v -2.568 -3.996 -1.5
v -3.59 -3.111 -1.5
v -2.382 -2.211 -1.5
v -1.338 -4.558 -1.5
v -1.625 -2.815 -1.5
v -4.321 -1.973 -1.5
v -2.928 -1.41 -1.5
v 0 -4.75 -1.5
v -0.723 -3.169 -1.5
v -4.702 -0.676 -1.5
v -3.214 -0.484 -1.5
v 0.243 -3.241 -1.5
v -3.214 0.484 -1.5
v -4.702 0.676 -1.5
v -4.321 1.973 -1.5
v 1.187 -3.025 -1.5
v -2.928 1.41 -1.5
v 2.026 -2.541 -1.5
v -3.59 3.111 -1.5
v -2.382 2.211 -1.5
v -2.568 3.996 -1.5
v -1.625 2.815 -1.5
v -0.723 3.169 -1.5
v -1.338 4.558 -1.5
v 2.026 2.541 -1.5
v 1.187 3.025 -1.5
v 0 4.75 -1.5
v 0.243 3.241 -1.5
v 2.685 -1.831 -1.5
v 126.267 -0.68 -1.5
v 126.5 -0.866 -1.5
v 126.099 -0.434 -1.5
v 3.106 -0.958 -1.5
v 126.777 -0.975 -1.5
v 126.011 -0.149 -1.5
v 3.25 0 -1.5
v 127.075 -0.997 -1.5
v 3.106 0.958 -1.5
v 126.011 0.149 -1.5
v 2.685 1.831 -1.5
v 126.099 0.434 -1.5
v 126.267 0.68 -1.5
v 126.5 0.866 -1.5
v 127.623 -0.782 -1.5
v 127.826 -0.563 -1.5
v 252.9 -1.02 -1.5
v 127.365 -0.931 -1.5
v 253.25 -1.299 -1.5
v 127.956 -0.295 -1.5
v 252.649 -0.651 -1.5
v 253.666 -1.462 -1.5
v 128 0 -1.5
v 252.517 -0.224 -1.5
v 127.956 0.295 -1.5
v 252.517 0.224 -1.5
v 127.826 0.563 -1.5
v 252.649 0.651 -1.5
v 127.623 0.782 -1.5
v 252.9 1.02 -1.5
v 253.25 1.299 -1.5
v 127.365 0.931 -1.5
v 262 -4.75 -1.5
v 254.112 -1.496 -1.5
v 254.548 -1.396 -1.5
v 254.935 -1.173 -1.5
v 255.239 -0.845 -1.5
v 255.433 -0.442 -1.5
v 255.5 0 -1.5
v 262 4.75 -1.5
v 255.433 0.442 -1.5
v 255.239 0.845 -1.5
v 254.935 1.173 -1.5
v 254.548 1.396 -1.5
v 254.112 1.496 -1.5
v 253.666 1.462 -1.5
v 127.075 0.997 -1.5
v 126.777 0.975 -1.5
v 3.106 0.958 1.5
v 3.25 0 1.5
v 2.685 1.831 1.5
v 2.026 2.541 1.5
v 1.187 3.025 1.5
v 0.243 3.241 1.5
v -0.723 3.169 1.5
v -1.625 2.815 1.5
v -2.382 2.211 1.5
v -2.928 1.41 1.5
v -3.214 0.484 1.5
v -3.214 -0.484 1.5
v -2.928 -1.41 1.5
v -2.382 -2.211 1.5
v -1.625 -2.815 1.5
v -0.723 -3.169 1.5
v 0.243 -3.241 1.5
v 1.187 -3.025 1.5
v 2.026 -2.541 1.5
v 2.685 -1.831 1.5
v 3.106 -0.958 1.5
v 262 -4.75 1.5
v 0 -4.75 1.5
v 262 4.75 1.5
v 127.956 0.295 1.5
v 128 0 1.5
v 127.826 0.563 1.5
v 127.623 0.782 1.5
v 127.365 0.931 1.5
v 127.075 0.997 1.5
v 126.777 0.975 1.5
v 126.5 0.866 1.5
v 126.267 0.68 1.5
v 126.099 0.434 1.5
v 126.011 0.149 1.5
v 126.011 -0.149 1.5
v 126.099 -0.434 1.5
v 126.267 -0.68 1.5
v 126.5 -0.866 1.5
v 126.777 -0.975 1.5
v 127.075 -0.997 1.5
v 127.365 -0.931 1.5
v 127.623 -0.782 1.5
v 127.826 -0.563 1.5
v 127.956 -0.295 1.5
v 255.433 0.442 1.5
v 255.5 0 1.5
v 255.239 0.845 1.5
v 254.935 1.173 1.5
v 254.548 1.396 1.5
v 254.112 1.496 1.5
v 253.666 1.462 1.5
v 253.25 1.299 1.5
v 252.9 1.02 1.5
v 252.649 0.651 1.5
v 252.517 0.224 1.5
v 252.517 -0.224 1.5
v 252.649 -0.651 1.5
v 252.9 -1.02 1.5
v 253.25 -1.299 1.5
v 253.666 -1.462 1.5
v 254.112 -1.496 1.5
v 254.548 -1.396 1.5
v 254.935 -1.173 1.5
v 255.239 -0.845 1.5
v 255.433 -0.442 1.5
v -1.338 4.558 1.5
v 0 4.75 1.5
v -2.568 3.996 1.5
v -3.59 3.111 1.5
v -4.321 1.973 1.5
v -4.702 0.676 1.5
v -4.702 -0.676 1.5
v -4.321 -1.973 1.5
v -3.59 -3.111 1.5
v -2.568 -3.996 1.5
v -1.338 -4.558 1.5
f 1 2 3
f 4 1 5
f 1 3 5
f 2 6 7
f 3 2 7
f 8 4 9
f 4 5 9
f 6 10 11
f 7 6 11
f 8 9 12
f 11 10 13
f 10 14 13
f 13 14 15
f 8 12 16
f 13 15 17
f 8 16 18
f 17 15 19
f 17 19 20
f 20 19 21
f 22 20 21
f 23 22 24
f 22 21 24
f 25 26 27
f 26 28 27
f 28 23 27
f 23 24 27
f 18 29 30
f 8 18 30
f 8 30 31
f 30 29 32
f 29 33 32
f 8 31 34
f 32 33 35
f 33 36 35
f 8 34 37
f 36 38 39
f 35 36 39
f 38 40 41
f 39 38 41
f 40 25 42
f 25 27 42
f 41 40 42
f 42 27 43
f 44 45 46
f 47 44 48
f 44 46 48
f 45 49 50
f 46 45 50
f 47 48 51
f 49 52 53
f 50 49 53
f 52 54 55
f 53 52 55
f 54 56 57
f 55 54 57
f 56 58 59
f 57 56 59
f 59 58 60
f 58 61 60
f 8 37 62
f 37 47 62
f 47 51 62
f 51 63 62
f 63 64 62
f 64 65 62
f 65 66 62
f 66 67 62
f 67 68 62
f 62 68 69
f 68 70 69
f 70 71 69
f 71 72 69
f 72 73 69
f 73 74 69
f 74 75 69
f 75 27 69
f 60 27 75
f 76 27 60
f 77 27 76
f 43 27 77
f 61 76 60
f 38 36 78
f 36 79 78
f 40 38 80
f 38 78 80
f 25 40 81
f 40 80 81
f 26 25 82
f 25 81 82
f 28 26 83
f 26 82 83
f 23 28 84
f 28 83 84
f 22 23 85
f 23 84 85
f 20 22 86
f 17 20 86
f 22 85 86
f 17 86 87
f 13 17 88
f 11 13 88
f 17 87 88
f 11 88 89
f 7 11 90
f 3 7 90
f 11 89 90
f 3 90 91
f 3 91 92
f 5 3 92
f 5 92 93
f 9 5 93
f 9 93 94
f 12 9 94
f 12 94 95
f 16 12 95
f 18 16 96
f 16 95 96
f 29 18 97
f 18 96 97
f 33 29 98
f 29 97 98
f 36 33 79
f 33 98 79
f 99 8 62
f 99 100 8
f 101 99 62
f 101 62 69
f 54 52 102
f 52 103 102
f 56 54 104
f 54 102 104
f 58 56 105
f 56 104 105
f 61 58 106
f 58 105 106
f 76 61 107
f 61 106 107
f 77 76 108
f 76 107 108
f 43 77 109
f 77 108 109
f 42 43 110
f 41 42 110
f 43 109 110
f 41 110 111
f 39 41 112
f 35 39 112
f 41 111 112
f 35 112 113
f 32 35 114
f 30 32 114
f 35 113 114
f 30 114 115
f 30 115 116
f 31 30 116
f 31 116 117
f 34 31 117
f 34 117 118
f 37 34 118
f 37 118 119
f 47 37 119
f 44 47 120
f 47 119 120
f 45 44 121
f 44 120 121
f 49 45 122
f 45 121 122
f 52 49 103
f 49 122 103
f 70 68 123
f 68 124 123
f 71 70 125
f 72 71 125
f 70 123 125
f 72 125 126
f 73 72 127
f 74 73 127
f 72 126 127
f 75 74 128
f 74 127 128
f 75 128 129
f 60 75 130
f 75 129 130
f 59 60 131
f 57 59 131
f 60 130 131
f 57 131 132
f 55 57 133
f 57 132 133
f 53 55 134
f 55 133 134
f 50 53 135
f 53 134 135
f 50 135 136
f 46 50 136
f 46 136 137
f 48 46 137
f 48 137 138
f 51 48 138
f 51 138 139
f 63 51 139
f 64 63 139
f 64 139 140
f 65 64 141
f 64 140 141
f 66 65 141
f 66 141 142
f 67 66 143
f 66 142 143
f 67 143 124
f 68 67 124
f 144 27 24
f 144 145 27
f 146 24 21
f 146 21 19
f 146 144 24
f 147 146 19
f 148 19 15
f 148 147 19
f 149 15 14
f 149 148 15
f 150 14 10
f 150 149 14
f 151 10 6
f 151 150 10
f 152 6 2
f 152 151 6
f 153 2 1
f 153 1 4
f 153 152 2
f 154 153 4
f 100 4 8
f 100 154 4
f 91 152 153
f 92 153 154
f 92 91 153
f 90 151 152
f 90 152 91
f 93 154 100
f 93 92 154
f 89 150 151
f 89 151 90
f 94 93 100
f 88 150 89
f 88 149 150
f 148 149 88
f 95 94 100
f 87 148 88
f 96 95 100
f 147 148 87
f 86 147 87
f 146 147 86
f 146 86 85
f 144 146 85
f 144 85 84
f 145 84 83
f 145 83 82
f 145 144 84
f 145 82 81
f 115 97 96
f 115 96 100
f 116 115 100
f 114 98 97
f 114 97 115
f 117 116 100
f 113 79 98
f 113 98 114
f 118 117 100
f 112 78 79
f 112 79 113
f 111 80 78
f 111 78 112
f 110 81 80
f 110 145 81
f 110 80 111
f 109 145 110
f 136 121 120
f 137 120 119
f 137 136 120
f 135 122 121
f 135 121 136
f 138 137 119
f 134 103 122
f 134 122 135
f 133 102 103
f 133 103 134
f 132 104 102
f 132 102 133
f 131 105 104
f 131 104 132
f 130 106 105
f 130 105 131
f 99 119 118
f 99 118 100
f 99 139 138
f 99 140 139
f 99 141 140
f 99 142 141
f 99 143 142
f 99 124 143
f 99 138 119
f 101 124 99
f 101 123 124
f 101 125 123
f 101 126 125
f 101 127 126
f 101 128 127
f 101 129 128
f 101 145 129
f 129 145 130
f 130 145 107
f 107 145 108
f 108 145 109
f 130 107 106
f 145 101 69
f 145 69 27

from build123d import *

# Parameters (mm, degrees)
BOSS_EXTRUDE1_DEPTH = 1.5
SKETCH2_R           = 3.25
SKETCH2_R_2         = 1
SKETCH2_R_3         = 1.5
CUT_EXTRUDE1_DEPTH  = 20


with BuildPart() as part:
    # Sketch1 → Boss-Extrude1 (new, symmetric)
    with BuildSketch(Plane.XY):
        with BuildLine():
            Line((0, -4.75), (262, -4.75))
            Line((262, -4.75), (262, 4.75))
            Line((262, 4.75), (0, 4.75))
            ThreePointArc((0, 4.75), (-4.75, 0), (0, -4.75))
        make_face()
    extrude(amount=BOSS_EXTRUDE1_DEPTH, both=True)

    # Sketch2 → Cut-Extrude1 (cut, symmetric)
    with BuildSketch(Plane.XY):
        Circle(SKETCH2_R)
        with Locations((127, 0)):
            Circle(SKETCH2_R_2)
        with Locations((254, 0)):
            Circle(SKETCH2_R_3)
    extrude(amount=CUT_EXTRUDE1_DEPTH, both=True, mode=Mode.SUBTRACT)


solid = part.part
